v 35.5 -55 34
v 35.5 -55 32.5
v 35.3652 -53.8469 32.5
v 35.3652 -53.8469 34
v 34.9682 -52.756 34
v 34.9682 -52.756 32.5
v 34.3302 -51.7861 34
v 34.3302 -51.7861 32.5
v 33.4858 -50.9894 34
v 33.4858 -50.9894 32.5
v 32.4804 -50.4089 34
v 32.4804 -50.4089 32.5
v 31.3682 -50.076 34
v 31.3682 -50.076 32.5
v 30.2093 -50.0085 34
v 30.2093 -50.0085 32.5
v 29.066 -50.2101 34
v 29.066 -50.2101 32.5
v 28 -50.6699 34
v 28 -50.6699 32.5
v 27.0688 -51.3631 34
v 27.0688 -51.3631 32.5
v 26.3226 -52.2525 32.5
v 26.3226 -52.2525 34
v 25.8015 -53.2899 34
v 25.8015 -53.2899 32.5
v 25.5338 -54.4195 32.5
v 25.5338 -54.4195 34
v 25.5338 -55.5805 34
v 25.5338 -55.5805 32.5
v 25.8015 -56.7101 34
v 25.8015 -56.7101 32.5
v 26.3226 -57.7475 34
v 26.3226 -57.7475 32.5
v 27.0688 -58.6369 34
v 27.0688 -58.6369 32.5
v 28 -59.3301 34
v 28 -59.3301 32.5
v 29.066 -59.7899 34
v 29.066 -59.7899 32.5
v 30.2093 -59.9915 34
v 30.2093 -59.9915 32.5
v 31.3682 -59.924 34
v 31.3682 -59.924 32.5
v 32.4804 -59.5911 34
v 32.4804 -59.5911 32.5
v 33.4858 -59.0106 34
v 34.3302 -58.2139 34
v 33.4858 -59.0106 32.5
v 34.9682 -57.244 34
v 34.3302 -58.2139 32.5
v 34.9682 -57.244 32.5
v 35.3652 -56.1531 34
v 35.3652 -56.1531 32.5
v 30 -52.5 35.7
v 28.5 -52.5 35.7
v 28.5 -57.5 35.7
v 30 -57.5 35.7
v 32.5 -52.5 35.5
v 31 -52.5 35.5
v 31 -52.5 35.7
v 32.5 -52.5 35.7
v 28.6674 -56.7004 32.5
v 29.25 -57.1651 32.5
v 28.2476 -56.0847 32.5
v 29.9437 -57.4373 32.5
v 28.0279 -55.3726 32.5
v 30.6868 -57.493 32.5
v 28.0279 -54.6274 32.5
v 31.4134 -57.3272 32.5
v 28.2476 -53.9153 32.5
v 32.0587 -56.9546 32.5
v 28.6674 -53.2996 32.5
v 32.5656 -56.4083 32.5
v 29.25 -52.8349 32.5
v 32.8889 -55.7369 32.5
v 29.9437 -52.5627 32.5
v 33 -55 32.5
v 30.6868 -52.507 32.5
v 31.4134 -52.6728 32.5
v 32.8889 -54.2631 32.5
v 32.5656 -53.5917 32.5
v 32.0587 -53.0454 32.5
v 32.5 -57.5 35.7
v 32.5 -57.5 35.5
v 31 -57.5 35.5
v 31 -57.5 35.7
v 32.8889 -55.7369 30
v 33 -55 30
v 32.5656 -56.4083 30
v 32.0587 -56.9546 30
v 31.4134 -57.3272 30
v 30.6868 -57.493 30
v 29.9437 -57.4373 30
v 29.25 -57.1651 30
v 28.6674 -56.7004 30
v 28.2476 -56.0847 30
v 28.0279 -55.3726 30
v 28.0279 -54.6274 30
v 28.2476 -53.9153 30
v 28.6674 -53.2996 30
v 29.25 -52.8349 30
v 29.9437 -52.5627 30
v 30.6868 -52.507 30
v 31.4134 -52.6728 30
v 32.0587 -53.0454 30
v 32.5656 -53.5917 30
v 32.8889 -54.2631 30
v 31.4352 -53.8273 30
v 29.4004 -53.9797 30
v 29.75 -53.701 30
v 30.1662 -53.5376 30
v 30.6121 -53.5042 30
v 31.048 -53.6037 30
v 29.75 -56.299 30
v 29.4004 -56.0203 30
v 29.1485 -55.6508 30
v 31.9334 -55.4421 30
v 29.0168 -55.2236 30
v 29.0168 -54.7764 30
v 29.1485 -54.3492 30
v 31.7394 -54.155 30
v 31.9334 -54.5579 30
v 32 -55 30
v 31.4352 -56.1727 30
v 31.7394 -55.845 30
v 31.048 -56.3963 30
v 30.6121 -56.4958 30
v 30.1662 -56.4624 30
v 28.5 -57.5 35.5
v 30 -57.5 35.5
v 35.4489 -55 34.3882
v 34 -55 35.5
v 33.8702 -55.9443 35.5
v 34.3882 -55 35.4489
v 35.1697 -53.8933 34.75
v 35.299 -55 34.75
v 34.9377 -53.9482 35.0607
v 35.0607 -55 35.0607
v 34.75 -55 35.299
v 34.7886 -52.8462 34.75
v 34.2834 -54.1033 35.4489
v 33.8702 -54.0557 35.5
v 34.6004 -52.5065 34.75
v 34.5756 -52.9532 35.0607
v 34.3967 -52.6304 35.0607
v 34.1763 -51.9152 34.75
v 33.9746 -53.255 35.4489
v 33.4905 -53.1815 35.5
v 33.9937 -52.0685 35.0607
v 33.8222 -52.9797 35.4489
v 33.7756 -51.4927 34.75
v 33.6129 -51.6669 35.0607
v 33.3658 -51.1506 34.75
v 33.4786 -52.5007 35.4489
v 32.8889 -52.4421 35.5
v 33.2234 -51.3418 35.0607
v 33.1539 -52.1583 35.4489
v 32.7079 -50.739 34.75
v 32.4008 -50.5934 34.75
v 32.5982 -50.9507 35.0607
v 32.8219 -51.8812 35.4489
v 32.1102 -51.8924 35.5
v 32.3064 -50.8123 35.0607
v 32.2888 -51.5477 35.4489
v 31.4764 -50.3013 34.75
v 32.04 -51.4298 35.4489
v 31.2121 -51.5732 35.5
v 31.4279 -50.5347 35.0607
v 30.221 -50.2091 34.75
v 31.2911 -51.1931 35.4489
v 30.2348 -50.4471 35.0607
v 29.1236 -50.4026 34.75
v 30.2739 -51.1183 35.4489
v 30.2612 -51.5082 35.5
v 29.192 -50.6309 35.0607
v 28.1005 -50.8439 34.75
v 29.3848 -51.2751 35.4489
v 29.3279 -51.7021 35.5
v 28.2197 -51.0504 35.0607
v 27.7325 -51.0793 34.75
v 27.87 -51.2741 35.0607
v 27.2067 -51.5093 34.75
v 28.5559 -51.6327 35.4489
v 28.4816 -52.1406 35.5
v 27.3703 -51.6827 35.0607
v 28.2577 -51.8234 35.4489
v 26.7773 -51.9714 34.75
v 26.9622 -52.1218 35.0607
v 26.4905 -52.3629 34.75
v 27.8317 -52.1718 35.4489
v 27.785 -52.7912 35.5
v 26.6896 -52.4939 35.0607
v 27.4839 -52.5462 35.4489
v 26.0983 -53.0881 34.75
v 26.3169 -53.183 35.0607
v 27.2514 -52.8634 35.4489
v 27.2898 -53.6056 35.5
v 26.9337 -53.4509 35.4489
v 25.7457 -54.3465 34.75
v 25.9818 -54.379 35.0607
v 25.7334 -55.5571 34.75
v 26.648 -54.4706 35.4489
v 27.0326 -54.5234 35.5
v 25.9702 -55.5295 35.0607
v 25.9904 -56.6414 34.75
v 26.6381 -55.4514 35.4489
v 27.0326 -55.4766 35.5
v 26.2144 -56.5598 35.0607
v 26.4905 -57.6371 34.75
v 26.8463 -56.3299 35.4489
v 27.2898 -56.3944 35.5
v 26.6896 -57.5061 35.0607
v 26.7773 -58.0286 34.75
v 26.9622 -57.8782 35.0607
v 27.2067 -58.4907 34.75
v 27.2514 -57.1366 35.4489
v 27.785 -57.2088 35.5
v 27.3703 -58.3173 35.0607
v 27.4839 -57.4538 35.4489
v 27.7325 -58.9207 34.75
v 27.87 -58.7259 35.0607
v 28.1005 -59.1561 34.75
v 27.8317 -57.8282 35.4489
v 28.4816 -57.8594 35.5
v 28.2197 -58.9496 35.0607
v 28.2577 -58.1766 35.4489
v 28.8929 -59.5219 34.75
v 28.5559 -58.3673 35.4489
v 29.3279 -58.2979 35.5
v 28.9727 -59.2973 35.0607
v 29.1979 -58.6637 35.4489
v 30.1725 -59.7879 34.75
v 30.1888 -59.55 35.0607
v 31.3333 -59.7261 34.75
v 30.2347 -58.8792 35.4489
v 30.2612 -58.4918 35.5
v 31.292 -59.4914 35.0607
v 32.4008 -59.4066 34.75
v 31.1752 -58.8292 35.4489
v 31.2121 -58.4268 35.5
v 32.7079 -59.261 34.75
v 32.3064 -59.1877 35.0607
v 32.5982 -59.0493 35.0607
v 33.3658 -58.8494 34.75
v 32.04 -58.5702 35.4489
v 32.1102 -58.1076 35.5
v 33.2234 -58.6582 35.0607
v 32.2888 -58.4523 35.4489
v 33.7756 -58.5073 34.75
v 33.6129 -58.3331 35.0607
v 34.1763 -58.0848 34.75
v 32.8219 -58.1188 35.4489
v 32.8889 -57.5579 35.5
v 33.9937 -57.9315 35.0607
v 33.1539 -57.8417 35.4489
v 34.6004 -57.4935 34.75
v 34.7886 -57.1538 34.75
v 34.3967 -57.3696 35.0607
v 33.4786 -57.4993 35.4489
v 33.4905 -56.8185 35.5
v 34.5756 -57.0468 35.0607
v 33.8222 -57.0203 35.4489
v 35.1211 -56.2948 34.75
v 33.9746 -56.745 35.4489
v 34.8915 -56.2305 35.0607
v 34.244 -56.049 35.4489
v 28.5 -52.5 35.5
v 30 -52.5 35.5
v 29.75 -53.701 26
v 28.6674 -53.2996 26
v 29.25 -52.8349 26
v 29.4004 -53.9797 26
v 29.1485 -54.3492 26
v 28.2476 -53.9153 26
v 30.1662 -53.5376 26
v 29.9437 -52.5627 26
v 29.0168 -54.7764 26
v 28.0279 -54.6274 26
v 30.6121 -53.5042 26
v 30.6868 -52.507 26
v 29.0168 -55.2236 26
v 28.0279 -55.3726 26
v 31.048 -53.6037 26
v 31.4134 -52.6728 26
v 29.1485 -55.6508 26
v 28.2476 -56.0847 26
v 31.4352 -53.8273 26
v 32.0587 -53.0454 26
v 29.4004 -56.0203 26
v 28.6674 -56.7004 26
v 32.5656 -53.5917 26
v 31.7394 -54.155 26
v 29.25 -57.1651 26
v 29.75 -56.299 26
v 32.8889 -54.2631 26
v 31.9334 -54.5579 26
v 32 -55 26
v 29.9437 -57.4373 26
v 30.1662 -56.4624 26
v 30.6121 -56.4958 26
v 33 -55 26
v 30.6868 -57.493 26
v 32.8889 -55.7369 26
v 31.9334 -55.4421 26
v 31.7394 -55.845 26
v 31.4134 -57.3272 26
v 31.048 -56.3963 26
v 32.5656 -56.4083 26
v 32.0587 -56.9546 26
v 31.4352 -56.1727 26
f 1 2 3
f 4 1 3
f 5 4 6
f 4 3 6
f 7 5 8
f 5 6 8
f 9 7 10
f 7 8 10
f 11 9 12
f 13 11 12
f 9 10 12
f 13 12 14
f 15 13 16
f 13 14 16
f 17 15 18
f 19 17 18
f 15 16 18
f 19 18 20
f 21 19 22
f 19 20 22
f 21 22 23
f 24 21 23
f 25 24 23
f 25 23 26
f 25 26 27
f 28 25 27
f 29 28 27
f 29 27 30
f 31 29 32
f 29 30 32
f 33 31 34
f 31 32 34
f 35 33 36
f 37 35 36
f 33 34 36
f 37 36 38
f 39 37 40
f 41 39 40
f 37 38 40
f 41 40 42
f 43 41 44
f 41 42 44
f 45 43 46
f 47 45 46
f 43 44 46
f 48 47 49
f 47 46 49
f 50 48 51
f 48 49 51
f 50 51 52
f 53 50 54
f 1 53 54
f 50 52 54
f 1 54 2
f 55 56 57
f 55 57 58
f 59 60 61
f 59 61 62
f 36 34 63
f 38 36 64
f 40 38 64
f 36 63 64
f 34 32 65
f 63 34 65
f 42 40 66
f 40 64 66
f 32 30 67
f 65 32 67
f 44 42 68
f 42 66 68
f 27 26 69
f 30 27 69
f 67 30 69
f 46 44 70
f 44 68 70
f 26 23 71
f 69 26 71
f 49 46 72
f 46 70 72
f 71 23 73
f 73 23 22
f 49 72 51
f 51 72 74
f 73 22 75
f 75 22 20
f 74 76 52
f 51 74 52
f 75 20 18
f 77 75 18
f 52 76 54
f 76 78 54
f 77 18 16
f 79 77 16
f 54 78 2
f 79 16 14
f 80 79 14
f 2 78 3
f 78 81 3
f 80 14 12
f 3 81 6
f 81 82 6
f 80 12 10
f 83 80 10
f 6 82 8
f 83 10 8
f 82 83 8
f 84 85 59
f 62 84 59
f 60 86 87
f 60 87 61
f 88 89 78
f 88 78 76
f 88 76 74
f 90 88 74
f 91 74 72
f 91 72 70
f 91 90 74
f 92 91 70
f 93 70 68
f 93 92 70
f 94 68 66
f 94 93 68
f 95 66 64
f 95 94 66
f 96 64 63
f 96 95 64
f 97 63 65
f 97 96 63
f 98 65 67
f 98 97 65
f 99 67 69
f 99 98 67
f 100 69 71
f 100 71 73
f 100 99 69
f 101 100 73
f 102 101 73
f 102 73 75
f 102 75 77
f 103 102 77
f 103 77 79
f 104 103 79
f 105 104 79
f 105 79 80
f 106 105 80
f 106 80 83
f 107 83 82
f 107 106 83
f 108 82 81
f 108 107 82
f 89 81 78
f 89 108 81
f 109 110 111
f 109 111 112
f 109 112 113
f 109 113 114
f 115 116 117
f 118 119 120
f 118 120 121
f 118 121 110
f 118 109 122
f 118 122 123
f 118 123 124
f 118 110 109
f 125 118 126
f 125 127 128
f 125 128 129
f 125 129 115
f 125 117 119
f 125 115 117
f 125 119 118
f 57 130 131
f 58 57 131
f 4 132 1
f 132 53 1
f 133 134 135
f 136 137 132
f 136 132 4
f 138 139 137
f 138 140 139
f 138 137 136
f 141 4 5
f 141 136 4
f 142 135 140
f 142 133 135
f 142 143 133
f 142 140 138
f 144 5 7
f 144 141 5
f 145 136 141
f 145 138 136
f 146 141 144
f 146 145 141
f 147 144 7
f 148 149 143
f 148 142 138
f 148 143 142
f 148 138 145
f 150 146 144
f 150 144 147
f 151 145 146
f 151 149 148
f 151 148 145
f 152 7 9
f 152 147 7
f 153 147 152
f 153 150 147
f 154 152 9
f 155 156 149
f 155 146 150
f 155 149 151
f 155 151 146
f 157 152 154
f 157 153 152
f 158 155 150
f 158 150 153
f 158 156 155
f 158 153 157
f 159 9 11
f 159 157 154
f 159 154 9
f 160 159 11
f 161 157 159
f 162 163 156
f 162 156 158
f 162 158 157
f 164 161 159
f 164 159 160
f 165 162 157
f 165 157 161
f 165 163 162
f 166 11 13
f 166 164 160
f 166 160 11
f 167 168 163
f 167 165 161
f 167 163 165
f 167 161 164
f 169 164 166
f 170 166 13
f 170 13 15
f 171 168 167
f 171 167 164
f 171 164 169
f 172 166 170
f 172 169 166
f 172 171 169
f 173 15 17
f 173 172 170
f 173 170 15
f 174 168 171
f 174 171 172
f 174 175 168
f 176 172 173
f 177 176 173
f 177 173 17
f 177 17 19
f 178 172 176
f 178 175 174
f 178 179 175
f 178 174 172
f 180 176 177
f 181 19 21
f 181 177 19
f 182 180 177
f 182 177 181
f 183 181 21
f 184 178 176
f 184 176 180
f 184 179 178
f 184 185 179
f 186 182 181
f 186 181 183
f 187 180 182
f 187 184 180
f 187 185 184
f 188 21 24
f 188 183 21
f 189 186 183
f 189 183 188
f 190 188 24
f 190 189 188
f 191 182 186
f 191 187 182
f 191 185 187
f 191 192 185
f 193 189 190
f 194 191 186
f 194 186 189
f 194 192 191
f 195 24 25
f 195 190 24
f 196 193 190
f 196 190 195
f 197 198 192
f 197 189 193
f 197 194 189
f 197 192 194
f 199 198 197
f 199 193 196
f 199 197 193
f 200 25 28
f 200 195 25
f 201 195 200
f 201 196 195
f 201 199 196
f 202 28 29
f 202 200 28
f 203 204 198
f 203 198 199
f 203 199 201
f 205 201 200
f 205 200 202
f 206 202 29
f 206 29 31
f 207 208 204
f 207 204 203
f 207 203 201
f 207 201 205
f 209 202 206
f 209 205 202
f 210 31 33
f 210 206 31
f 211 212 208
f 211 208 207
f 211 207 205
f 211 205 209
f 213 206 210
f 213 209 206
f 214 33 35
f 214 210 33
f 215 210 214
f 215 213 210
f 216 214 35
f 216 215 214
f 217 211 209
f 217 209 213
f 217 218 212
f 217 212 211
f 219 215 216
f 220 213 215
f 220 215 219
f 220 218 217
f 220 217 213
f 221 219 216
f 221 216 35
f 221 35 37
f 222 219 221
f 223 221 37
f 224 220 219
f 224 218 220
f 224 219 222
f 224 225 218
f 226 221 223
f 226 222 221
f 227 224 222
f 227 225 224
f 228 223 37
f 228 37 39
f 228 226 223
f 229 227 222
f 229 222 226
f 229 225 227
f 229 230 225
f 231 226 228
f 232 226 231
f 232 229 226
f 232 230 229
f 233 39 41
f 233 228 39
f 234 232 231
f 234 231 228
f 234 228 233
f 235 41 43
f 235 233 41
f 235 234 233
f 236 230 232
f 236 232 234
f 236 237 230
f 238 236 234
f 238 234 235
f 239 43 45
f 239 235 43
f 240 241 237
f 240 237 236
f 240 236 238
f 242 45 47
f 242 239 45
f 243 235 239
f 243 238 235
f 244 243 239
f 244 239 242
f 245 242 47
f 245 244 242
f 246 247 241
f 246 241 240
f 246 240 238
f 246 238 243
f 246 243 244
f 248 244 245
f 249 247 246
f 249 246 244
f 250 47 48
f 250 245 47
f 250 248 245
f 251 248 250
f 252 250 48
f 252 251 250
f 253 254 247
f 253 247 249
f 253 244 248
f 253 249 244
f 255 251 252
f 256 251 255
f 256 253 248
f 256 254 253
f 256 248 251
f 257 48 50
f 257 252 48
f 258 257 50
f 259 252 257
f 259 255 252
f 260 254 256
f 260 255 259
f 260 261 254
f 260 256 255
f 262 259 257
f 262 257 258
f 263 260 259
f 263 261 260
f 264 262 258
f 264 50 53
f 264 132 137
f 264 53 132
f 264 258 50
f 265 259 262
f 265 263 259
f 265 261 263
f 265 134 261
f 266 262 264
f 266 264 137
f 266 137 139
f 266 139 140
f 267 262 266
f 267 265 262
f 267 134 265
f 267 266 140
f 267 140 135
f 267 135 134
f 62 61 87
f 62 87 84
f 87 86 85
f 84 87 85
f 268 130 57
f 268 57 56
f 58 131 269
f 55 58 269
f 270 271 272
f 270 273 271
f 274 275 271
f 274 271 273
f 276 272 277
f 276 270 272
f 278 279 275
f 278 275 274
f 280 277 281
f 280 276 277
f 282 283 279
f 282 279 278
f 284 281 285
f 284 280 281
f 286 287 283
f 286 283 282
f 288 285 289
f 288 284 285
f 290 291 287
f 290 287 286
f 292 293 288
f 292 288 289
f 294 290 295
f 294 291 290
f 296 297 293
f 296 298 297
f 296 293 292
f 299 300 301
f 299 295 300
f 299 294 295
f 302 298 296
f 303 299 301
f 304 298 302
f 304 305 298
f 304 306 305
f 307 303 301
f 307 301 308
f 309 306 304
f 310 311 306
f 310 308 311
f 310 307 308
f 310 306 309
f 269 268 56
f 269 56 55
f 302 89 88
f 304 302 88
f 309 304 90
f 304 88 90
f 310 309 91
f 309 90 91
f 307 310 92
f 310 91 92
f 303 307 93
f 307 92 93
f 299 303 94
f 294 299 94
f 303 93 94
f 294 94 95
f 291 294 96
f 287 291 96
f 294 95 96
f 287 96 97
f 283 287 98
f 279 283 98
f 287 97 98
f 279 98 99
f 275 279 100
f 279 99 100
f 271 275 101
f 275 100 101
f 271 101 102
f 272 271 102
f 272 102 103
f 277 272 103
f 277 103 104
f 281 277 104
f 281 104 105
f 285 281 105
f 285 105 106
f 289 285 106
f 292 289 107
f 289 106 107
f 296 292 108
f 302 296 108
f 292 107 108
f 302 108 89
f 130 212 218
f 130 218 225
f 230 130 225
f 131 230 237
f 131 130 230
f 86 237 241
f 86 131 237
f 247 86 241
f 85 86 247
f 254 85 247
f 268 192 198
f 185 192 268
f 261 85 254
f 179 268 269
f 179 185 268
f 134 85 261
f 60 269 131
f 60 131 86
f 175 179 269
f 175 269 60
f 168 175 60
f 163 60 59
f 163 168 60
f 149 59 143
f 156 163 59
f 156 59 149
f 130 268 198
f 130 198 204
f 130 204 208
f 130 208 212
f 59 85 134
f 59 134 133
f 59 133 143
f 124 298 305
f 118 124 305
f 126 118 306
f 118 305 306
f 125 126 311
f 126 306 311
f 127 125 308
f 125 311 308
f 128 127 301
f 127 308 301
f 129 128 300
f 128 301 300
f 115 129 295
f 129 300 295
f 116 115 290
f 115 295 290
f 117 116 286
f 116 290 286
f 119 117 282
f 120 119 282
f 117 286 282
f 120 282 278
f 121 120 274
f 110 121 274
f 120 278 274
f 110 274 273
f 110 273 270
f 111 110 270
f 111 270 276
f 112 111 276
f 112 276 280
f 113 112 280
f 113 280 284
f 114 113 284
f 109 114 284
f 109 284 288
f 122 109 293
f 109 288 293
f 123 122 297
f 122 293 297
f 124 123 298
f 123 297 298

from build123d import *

# Parameters (mm, degrees)
SKETCH046_R     = 2.5
PAD023_DEPTH    = 2.5
SKETCH047_R     = 5
PAD024_DEPTH    = 3
FILLET003_R     = 1.5
SKETCH049_R     = 2.5
PAD025_DEPTH    = 4
SKETCH050_R     = 1.5
POCKET026_DEPTH = 4
SKETCH088_W     = 1.5
SKETCH088_H     = 5
PAD052_DEPTH    = 0.2


with BuildPart() as part:
    # Sketch046 → Pad023 (new body)
    with BuildSketch(Plane(origin=(0, 0, 30), x_dir=(1, 0, 0), z_dir=(0, 0, -1))):
        with Locations((101, 55)):
            Circle(SKETCH046_R)
    extrude(amount=-PAD023_DEPTH)

    # Sketch047 (on Face3 of Pad023) → Pad024 (join)
    with BuildSketch(Plane.XY.offset(32.5)):
        with Locations((101, -55)):
            Circle(SKETCH047_R)
    extrude(amount=PAD024_DEPTH)

    # Fillet003
    fillet003_edges = [part.edges().sort_by_distance(p)[0] for p in [
        (96, -55, 35.5),
    ]]
    fillet(fillet003_edges, radius=FILLET003_R)

    # Sketch049 → Pad025 (join)
    with BuildSketch(Plane(origin=(0, 0, 30), x_dir=(1, 0, 0), z_dir=(0, 0, -1))):
        with Locations((101, 55)):
            Circle(SKETCH049_R)
    extrude(amount=PAD025_DEPTH)

    # Sketch050 (on Face17 of Pad025) → Pocket026 (cut)
    with BuildSketch(Plane(origin=(0, 0, 26), x_dir=(1, 0, 0), z_dir=(0, 0, -1))):
        with Locations((101, 55)):
            Circle(SKETCH050_R)
    extrude(amount=-POCKET026_DEPTH, mode=Mode.SUBTRACT)


with BuildPart() as part_1:
    # Body002 placement: moved
    add(part.part.moved(Location((75, 0, 0))))

    # Sketch088 (on Face4 of Clone001) → Pad052 (new body)
    with BuildSketch(Plane(origin=(75, 0, 35.5), x_dir=(1, 0, 0), z_dir=(0, 0, 1))):
        with Locations((99.75, -55)):
            Rectangle(SKETCH088_W, SKETCH088_H)
        with Locations((102.25, -55)):
            Rectangle(SKETCH088_W, SKETCH088_H)
    extrude(amount=PAD052_DEPTH)


with BuildPart() as part_2:
    # Body010 placement: moved
    add(part_1.part.moved(Location((-145.5, 0, 0))))


solid = part_2.part
